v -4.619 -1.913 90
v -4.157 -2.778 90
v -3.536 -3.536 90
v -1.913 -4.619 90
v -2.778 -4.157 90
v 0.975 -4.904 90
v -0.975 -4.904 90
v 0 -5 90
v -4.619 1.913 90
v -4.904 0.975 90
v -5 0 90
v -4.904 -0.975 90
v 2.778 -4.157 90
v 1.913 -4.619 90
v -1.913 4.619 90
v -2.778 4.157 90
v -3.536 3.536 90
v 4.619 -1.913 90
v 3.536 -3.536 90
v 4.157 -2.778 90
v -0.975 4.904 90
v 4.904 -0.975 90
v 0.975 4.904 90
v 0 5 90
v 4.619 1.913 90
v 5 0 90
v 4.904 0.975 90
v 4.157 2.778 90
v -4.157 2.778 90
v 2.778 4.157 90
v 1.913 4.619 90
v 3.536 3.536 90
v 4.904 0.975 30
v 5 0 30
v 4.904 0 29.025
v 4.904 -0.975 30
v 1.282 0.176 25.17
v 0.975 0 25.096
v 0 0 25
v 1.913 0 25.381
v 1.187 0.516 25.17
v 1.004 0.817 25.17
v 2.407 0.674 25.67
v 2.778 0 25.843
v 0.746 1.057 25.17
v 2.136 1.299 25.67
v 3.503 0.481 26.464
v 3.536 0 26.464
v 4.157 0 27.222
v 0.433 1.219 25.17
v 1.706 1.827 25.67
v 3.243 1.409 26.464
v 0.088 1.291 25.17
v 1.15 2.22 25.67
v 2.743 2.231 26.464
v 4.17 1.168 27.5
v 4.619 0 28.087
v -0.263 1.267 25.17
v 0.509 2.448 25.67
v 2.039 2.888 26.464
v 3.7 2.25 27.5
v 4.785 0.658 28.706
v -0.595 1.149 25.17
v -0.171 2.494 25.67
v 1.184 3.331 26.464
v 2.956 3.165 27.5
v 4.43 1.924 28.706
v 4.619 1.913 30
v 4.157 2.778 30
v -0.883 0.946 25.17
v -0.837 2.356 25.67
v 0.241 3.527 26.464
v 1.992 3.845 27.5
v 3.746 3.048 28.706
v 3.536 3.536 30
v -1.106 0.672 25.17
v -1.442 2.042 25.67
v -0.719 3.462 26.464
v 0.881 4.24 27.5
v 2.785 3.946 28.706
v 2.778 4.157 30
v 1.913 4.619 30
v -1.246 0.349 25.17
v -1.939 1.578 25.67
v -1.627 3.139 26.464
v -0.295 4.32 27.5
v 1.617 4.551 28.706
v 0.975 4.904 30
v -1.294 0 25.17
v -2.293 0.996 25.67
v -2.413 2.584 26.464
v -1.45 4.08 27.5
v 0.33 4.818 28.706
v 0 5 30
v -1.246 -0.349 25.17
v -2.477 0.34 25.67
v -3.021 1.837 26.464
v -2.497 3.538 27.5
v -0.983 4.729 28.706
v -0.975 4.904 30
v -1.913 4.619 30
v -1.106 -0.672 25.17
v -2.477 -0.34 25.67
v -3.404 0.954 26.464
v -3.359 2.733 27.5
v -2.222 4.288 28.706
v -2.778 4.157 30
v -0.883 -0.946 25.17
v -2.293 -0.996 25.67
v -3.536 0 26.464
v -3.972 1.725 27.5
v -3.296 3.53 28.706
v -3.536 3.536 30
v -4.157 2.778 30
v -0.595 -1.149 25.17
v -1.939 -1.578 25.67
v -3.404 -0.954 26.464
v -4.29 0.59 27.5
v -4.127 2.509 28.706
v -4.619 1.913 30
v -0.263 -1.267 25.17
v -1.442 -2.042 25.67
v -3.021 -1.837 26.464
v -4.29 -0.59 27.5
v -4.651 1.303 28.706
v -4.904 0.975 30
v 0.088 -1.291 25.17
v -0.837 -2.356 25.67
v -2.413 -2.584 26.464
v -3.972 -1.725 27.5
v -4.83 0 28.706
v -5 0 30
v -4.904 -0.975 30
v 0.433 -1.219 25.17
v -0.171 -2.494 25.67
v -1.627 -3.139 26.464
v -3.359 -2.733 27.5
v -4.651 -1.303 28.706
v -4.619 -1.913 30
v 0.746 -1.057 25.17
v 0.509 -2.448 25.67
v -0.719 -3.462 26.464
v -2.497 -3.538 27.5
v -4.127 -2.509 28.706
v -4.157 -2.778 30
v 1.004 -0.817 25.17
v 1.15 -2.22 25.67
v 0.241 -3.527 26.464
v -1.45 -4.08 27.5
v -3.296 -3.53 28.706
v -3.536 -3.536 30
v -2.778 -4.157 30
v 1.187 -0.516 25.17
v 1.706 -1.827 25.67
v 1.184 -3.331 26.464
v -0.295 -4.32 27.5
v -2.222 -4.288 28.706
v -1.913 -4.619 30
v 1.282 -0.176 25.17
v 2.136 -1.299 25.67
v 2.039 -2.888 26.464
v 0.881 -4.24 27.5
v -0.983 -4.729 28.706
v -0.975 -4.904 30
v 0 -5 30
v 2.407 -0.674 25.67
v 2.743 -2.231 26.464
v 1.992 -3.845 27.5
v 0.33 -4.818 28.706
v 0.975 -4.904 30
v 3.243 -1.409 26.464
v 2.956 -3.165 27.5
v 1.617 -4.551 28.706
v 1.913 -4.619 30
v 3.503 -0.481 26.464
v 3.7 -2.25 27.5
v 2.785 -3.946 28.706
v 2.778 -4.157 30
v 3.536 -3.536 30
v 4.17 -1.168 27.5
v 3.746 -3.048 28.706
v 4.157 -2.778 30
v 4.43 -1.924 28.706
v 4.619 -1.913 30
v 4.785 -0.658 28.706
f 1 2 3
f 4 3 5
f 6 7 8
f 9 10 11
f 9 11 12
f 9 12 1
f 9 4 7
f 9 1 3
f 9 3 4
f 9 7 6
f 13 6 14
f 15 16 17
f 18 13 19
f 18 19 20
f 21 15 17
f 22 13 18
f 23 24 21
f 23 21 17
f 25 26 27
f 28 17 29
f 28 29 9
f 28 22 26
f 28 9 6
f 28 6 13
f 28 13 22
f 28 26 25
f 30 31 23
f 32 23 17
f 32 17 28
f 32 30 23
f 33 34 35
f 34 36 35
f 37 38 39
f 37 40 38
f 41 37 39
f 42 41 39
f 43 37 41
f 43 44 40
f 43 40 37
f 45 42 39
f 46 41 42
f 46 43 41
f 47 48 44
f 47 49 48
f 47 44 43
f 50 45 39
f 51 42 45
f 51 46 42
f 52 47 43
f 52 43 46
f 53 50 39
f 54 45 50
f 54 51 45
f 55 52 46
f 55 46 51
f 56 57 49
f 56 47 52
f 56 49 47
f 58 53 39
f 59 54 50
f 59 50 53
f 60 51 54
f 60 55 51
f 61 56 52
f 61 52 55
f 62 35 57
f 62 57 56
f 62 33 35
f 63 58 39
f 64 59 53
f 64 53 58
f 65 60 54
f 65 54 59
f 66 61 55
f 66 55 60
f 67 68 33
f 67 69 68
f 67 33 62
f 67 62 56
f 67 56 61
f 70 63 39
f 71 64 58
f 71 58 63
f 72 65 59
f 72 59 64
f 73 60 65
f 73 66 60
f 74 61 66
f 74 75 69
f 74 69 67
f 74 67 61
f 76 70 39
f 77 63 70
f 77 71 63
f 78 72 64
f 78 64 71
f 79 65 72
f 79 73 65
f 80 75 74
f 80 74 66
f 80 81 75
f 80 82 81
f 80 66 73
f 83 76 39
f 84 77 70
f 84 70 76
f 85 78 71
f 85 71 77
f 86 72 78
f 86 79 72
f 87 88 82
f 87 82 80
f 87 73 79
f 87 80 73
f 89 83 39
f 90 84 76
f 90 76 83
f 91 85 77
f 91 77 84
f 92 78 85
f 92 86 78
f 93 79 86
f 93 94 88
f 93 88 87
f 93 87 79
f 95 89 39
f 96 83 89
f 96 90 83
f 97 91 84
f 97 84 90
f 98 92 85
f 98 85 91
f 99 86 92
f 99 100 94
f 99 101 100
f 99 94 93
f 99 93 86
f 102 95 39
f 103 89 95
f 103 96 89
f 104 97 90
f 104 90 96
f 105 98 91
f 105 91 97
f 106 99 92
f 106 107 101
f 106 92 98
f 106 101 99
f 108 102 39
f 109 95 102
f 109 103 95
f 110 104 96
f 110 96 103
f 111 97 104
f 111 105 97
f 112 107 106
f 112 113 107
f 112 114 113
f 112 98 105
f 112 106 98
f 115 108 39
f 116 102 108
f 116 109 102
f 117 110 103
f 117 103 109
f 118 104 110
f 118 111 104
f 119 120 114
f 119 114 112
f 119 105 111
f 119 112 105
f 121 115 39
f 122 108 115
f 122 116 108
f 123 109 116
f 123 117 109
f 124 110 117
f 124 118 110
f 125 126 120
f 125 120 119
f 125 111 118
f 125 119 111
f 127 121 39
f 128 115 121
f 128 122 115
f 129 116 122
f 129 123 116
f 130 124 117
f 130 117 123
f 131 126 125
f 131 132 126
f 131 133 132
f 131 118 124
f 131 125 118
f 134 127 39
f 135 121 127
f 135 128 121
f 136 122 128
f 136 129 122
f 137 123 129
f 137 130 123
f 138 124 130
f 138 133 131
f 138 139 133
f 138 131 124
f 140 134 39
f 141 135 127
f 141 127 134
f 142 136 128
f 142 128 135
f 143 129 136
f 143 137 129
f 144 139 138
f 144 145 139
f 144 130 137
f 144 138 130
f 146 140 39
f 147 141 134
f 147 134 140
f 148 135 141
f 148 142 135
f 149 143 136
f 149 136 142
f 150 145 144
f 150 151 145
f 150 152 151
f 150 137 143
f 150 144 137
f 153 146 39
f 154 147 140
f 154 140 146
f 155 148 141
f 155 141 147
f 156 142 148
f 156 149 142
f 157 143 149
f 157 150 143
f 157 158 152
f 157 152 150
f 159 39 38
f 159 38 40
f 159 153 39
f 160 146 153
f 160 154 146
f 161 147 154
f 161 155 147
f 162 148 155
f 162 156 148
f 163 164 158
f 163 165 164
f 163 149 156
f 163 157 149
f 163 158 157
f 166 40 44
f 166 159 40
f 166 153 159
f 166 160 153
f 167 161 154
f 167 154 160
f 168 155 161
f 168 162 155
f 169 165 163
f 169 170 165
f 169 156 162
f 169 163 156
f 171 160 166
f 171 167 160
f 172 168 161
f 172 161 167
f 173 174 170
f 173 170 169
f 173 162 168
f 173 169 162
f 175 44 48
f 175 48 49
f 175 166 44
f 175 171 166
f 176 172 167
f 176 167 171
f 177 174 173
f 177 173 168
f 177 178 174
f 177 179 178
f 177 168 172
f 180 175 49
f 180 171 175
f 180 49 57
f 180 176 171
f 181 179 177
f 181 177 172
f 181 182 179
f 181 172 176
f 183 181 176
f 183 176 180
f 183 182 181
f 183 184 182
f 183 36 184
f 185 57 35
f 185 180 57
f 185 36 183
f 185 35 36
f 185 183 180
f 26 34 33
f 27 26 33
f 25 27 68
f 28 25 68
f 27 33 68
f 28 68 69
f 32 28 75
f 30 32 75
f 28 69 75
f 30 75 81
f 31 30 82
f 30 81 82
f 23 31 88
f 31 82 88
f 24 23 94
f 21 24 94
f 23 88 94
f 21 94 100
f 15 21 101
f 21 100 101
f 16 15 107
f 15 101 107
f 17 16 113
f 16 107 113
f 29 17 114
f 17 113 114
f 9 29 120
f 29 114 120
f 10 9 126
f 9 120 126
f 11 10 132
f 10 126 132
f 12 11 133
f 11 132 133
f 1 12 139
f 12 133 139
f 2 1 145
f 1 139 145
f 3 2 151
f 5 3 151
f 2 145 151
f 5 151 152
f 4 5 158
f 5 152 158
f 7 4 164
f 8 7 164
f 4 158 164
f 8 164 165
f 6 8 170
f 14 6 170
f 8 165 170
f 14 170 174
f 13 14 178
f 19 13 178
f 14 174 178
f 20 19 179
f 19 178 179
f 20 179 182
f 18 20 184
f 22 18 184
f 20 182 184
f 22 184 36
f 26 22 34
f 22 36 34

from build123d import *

# Parameters (mm, degrees)
CYLINDER001_R     = 5
CYLINDER001_DEPTH = 60


with BuildPart() as cylinder001:
    # Cylinder001 → Cylinder001 (new body)
    with BuildSketch(Plane.XY):
        Circle(CYLINDER001_R)
    extrude(amount=CYLINDER001_DEPTH)


with BuildPart() as fusion001:
    # Sphere → Sphere (revolve)
    with BuildSketch(Plane.XZ):
        with BuildLine():
            ThreePointArc((0, -5), (5, 0), (0, 5))
            Line((0, 5), (0, -5))
        make_face()
    revolve(axis=Axis((0, 0, 0), (0, 0, 1)))

    # Fusion001: union Cylinder001
    add(cylinder001.part)


with BuildPart() as fusion001_1:
    # Fusion001 placement: moved
    add(fusion001.part.moved(Location((0, 0, 30))))


solid = fusion001_1.part
